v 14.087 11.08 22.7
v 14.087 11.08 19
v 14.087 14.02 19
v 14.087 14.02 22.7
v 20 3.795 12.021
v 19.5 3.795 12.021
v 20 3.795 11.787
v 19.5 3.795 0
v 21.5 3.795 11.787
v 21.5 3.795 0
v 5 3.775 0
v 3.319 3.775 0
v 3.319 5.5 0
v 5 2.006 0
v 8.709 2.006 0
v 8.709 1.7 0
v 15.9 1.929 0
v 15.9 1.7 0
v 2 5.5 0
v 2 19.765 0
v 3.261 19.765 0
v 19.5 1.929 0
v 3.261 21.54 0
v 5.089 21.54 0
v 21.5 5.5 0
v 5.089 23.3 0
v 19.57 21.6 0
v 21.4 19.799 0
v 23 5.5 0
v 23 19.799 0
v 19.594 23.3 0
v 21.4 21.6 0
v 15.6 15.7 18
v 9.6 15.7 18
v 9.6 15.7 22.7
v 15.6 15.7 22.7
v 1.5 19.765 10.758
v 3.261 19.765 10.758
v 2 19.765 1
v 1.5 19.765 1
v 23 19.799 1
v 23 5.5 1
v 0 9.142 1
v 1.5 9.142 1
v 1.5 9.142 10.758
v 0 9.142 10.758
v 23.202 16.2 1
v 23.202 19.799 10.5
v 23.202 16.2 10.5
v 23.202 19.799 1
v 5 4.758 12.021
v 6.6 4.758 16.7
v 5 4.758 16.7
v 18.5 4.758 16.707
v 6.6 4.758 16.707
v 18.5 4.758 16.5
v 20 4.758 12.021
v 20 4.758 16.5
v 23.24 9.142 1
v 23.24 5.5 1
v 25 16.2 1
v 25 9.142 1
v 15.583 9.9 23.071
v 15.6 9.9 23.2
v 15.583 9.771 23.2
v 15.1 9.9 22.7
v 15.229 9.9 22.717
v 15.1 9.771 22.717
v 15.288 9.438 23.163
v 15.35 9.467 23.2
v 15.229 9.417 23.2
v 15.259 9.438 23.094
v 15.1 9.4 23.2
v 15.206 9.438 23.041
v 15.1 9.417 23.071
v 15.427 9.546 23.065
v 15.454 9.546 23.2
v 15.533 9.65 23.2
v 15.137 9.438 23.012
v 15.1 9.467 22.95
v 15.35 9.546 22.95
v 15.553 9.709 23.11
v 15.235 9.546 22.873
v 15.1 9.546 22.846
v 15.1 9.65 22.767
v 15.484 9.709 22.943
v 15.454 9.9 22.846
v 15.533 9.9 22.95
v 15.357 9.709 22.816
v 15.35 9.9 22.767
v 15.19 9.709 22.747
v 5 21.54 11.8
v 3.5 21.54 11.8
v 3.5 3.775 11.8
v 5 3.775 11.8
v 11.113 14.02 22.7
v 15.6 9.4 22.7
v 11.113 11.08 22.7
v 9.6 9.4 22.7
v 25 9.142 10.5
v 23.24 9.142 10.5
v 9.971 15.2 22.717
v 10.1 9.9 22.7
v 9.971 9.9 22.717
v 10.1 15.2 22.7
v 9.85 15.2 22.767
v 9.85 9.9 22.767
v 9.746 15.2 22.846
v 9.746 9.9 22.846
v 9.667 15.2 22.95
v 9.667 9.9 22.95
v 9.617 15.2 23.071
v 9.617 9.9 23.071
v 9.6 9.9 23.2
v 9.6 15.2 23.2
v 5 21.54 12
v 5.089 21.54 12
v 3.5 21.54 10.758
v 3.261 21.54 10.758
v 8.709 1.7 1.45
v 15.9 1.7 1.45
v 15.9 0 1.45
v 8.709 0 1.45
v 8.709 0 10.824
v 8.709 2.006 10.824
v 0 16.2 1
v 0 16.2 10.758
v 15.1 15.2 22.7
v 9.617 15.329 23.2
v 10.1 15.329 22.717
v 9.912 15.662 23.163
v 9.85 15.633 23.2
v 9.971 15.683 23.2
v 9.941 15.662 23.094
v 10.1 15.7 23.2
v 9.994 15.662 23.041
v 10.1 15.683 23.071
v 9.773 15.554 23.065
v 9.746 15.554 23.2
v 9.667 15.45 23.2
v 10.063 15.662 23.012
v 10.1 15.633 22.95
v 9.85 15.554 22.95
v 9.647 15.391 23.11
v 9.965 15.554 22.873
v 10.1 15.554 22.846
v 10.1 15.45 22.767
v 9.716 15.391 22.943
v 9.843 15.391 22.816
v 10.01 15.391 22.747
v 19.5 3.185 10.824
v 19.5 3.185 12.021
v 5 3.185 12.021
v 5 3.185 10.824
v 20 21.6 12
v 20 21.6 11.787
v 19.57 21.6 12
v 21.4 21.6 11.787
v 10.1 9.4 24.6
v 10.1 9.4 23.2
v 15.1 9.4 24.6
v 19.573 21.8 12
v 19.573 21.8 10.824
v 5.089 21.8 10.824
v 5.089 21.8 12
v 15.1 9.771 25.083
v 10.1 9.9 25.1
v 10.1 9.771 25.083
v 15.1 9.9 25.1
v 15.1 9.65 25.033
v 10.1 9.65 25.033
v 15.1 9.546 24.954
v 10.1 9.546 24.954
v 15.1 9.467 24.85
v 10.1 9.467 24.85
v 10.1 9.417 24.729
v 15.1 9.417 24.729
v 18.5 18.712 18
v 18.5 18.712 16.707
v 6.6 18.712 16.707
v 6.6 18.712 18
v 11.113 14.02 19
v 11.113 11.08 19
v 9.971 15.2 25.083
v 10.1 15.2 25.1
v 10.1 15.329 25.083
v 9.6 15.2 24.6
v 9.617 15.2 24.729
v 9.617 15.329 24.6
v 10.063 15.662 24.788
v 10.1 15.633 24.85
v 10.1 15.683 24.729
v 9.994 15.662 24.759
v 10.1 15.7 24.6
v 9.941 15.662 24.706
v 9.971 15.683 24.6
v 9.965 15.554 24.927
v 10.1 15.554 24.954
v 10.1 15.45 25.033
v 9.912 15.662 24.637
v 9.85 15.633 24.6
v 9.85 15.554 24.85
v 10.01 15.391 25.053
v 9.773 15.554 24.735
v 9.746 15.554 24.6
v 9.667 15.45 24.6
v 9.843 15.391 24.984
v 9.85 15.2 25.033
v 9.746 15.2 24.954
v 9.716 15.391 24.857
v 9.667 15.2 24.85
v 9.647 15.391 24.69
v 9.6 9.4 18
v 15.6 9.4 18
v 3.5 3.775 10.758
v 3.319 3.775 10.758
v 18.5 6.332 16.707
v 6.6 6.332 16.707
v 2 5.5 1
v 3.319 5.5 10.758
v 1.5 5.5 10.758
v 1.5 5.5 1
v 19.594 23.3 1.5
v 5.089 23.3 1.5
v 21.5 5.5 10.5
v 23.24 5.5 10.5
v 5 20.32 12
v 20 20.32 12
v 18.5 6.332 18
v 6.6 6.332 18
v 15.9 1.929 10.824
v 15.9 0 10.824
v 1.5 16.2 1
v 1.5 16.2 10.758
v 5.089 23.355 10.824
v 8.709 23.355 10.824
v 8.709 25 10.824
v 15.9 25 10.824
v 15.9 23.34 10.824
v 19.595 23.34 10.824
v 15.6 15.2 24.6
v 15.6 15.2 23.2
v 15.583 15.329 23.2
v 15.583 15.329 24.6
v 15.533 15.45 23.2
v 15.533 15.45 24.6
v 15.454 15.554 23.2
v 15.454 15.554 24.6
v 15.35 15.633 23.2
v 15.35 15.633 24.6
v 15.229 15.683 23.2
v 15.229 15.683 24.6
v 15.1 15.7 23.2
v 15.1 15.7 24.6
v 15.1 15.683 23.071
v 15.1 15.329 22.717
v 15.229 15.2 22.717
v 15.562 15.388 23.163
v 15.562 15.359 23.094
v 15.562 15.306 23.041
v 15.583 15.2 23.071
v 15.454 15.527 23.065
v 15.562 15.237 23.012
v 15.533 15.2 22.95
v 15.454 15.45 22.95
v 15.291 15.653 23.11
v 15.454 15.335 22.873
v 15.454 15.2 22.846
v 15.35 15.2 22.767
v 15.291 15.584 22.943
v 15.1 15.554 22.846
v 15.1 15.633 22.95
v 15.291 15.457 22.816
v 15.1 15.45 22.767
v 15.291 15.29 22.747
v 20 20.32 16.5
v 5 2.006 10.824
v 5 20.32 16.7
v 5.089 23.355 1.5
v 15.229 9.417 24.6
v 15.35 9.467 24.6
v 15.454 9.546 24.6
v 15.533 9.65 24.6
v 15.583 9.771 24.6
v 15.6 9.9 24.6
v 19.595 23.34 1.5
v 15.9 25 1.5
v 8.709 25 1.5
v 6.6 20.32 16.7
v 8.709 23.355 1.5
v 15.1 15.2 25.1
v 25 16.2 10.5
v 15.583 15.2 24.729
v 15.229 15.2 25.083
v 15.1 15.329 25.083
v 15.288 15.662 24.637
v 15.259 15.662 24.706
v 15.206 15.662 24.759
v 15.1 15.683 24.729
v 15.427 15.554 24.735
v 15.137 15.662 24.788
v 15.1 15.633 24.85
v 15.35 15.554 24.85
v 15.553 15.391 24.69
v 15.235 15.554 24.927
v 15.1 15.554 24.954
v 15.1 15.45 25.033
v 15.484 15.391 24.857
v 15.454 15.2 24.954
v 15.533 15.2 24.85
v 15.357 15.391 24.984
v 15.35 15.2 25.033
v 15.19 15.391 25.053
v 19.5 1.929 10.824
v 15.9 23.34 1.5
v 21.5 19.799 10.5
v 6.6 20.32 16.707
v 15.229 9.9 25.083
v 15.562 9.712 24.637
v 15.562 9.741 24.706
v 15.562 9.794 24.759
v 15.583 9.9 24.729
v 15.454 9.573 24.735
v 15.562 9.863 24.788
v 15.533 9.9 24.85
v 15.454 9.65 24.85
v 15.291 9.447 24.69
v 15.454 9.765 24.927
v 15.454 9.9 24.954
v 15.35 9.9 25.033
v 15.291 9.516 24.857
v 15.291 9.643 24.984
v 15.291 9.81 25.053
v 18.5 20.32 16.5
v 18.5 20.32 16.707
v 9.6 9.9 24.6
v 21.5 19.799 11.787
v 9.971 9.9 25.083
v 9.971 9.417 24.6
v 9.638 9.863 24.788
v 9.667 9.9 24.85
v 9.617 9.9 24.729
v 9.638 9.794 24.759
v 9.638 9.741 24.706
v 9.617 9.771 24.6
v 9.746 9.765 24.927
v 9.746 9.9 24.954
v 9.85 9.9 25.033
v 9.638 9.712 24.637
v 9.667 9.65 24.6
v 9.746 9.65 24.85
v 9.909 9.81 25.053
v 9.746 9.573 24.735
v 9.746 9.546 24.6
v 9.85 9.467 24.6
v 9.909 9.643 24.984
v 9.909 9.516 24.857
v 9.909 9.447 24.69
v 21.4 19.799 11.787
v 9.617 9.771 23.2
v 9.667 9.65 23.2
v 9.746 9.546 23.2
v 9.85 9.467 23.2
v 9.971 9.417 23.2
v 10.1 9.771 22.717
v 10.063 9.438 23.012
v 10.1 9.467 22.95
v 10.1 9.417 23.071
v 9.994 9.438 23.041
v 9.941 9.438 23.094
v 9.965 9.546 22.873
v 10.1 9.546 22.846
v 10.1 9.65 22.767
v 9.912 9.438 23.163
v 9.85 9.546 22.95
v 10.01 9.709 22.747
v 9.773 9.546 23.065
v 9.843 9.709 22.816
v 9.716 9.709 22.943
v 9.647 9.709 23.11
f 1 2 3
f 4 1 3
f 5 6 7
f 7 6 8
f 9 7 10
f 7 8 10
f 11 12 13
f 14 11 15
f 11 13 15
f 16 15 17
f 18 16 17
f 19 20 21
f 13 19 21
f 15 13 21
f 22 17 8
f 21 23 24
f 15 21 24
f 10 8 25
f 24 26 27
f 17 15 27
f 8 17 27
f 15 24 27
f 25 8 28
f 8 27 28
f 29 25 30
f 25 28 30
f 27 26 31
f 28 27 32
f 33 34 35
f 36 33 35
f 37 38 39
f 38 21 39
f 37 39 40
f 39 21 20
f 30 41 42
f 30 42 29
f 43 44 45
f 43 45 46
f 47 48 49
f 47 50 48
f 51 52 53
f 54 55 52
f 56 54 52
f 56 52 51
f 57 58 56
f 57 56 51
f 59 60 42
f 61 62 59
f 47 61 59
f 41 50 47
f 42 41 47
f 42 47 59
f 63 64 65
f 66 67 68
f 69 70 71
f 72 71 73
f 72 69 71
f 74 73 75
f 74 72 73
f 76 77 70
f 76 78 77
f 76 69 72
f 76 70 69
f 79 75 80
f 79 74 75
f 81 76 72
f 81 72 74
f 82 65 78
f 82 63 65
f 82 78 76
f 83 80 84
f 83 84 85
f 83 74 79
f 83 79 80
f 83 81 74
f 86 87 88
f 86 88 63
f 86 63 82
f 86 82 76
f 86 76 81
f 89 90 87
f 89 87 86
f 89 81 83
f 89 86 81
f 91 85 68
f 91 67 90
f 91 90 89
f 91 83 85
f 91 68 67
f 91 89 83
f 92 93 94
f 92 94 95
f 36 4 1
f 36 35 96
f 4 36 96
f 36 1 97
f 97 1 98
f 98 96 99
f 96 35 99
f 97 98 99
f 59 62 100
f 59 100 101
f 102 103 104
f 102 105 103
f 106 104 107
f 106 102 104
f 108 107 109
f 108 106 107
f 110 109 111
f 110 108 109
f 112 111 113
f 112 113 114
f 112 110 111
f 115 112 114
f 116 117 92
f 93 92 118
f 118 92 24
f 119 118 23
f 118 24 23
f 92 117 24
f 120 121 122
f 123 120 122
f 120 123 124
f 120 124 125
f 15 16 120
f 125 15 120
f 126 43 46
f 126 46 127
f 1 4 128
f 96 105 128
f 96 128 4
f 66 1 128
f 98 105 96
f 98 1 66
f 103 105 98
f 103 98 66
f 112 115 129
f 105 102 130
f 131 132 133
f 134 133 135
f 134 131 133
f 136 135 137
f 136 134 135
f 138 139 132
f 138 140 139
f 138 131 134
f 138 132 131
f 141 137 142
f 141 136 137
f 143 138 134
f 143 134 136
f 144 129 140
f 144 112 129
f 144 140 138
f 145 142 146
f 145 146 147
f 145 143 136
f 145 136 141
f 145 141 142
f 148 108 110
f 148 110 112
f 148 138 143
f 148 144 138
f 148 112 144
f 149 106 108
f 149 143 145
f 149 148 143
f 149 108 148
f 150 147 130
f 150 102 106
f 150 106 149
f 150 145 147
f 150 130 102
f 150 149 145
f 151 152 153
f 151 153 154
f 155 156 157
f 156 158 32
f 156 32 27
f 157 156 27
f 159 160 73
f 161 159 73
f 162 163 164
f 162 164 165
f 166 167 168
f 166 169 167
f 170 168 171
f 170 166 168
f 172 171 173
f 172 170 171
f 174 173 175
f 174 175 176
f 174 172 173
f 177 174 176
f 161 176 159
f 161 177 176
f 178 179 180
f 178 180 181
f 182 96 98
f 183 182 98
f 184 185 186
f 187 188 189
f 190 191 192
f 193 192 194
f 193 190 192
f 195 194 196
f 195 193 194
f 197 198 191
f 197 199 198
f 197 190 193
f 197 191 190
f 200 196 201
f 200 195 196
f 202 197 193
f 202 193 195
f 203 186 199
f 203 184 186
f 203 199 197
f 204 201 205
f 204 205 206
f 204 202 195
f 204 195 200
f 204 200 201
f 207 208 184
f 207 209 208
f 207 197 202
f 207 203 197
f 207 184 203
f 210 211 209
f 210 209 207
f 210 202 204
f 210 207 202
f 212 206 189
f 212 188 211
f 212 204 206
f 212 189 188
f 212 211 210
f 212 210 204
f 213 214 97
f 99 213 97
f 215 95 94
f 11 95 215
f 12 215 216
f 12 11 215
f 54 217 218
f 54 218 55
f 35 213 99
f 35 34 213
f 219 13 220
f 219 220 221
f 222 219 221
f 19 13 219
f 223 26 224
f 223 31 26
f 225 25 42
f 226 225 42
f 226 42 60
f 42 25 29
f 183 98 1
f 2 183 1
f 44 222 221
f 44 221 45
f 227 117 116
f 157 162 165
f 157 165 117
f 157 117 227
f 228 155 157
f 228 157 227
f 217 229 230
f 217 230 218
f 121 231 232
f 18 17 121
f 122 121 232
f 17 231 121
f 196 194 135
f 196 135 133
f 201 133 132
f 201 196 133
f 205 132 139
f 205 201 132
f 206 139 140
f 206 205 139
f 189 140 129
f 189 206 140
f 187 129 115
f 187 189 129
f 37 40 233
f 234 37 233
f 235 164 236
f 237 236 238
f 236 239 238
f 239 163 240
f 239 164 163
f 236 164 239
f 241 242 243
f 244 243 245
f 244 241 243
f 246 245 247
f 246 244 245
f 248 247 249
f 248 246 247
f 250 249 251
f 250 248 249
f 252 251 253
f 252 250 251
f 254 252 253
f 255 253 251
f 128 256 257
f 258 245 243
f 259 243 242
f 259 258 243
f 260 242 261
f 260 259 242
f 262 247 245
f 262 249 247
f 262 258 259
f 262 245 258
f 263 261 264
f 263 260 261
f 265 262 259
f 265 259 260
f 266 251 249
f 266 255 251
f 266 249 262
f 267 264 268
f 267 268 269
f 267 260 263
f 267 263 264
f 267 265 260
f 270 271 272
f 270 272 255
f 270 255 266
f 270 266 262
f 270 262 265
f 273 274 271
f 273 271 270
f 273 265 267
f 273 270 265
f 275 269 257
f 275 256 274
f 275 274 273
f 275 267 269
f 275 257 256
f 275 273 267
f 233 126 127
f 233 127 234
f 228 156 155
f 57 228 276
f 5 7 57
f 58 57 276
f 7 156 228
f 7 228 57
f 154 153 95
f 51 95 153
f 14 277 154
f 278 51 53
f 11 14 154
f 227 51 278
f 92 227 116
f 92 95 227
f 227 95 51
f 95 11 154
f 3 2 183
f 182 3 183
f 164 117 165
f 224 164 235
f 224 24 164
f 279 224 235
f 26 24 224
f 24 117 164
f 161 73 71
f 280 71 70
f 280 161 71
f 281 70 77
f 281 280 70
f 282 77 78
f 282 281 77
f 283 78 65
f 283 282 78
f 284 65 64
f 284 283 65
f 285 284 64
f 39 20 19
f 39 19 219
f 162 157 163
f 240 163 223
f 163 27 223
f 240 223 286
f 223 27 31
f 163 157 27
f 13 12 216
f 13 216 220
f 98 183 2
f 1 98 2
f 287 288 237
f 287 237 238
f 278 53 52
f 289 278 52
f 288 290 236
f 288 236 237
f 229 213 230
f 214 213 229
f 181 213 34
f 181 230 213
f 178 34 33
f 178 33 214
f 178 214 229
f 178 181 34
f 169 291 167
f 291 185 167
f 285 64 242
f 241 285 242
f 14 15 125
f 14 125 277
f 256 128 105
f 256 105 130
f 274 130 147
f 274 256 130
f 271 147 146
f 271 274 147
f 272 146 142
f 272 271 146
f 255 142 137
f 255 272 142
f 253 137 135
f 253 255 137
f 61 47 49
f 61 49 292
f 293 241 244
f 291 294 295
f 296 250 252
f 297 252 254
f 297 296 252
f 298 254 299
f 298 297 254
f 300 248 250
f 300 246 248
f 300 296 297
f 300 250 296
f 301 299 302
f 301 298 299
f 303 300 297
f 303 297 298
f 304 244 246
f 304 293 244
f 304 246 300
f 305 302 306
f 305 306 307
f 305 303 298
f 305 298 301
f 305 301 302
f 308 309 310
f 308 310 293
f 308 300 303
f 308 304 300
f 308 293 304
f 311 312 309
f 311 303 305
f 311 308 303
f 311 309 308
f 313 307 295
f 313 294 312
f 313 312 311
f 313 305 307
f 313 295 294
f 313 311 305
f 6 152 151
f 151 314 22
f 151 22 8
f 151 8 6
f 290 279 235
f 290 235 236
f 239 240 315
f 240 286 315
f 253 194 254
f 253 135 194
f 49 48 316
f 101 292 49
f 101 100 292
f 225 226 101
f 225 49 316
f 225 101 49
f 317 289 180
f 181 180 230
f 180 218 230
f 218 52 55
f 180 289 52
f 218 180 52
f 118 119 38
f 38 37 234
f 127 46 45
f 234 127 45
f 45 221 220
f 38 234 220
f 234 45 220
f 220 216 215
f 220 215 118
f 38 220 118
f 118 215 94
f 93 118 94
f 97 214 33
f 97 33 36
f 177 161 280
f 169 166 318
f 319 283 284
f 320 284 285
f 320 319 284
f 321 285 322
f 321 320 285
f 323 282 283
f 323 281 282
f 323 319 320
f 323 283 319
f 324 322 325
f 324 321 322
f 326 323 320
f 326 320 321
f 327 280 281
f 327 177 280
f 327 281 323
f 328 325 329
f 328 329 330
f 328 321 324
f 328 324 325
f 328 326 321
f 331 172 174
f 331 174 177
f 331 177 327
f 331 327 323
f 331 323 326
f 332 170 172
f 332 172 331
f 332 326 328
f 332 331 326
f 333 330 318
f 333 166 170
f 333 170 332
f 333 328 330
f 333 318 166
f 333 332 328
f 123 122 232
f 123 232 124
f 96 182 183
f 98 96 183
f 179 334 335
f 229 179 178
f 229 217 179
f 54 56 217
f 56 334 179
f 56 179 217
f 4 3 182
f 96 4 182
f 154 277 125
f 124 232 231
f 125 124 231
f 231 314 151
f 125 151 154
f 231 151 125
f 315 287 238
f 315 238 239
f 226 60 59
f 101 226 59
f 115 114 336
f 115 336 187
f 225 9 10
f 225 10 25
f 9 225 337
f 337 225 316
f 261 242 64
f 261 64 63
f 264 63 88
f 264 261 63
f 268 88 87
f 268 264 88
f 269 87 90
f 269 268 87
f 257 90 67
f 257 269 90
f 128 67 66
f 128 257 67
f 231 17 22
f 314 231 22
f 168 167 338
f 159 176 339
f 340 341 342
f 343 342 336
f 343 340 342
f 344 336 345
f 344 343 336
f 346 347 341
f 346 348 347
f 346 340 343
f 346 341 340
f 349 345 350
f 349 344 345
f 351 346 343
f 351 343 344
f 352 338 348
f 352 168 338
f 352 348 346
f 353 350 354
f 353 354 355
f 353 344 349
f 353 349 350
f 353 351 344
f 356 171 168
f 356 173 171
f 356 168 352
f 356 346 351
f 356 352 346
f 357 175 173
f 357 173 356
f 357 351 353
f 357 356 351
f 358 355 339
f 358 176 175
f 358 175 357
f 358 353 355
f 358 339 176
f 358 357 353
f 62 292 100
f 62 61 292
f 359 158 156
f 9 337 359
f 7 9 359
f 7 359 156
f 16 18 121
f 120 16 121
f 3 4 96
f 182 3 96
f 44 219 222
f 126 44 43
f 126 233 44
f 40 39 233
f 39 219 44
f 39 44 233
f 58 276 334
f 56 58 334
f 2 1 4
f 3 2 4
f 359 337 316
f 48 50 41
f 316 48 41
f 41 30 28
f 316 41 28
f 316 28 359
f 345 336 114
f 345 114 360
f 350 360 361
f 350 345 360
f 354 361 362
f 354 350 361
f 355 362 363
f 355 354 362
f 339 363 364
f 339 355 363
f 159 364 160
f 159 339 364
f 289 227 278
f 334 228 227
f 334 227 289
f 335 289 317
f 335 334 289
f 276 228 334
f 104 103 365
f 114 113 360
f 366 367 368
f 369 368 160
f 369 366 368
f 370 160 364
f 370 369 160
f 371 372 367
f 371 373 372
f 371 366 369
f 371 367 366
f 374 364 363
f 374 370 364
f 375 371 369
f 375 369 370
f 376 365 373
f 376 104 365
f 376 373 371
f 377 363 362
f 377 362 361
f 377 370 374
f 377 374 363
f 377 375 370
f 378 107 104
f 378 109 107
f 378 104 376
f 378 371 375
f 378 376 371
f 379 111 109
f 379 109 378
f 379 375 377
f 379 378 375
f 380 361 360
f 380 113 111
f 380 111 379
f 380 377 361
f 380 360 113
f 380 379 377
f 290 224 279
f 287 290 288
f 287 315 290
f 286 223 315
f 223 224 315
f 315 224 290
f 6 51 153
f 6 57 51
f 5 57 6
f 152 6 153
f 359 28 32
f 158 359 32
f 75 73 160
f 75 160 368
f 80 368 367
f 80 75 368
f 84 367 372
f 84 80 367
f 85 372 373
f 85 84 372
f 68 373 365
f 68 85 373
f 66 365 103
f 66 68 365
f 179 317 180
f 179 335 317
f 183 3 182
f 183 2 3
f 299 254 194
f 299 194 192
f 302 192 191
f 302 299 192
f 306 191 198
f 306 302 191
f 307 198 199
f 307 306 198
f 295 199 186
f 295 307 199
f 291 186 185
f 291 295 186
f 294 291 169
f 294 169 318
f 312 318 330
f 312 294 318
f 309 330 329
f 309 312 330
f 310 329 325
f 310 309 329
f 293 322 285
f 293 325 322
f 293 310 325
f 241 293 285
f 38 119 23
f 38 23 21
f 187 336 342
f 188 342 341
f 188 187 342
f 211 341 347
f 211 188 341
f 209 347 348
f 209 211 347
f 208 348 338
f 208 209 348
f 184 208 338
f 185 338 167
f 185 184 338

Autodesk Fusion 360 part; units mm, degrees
sketch "Esquisse1" plane through (0, 0, 0) normal (0, 0, 1) x (1, 0, 0)
  line L0 (25, 25) -> (-25, 25)
  line L1 (-25, 25) -> (-25, -25)
  line L2 (-25, -25) -> (25, -25)
  line L3 (25, -25) -> (25, 25)
  line L4 (25, 25) -> (-25, -25) construction
  line L5 (-25, 25) -> (25, -25) construction
sketch "Esquisse2" plane through (0, 0, 0) normal (0, 0, 1) x (1, 0, 0)
  line L0 (25, 0) -> (0, 0)
  line L1 (0, 0) -> (0, 25)
  line L2 (0, 25) -> (25, 25)
  line L3 (25, 25) -> (25, 0)
  line L4 (25, 9.1424) -> (0, 9.1424)
  line L5 (0, 9.1424) -> (0, 16.2)
  line L6 (0, 16.2) -> (25, 16.2)
  line L7 (25, 16.2) -> (25, 9.1424)
  line L8 (15.9, 0) -> (8.7089, 0)
  line L9 (8.7089, 0) -> (8.7089, 25)
  line L10 (8.7089, 25) -> (15.9, 25)
  line L11 (15.9, 25) -> (15.9, 0)
  line L12 (23.2024, 19.7988) -> (23.2024, 16.2)
  line L13 (19.595, 23.3399) -> (15.9, 23.3399)
  line L14 (23.2024, 19.7988) -> (21.4, 19.7988)
  line L15 (21.4, 19.7988) -> (21.4, 21.6)
  line L16 (21.4, 21.6) -> (19.57, 21.6)
  line L17 (19.57, 21.6) -> (19.595, 23.3399)
  line L18 (5.0893, 23.3546) -> (8.7089, 23.3546)
  line L19 (5.0893, 21.5398) -> (5.0893, 23.3546)
  line L20 (5.0893, 21.5398) -> (3.2612, 21.5398)
  line L21 (3.2612, 21.5398) -> (3.2612, 19.7651)
  line L22 (3.2612, 19.7651) -> (1.5, 19.7651)
  line L23 (1.5, 19.7651) -> (1.5, 16.2)
  line L24 (8.7089, 2.0063) -> (5, 2.0063)
  line L25 (5, 2.0063) -> (5, 3.7754)
  line L26 (5, 3.7754) -> (3.3188, 3.7754)
  line L27 (3.3188, 3.7754) -> (3.3188, 5.5)
  line L28 (3.3188, 5.5) -> (1.5, 5.5)
  line L29 (1.5, 5.5) -> (1.5, 9.1424)
  line L30 (15.9, 1.9294) -> (19.5, 1.9294)
  line L31 (19.5, 1.9294) -> (19.5, 3.7947)
  line L32 (19.5, 3.7947) -> (21.5, 3.7947)
  line L33 (21.5, 3.7947) -> (21.5, 5.5)
  line L34 (21.5, 5.5) -> (23.2404, 5.5)
  line L35 (23.2404, 5.5) -> (23.2404, 9.1424)
extrude "Extrusion2" add sketch "Esquisse2" along normal blind 18 contours L0 L4 L8 L9 L11 | L3 L4 L6 L7 L11 | L4 L11 L30 L31 L32 L33 L34 L35 | L4 L9 L24 L25 L26 L27 L28 L29 | L4 L6 L9 L11 | L6 L11 L12 L13 L14 L15 L16 L17 | L1 L4 L5 L6 L9 | L2 L6 L9 L10 L11 | L6 L9 L18 L19 L20 L21 L22 L23 makes body 1
sketch "Esquisse3" plane through (0, 0, 0) normal (0, 1, 0) x (1, 0, 0)
  line L0 (25, -10.5) -> (21.5, -10.5)
  line L1 (21.5, -10.5) -> (21.5, -11.7872)
  line L2 (21.5, -11.7872) -> (20, -11.7872)
  line L3 (20, -11.7872) -> (20, -16.5)
  line L4 (20, -16.5) -> (18.5, -16.5)
  line L5 (18.5, -16.5) -> (18.5, -18)
  line L6 (18.5, -18) -> (15.5, -18)
  line L7 (15.5, -18) -> (15.5, -22.7294)
  line L8 (15.5, -22.7294) -> (14, -22.7294)
  line L9 (14, -22.7294) -> (14, -18)
  line L10 (14, -18) -> (15.5, -18)
  line L11 (-0.0186, -10.7584) -> (3.5, -10.7584)
  line L12 (3.5, -10.7584) -> (3.5, -11.8)
  line L13 (3.5, -11.8) -> (5, -11.8)
  line L14 (5, -11.8) -> (5, -16.7)
  line L15 (5, -16.7) -> (6.6, -16.7)
  line L16 (6.6, -16.7) -> (6.6, -18)
  line L17 (6.6, -18) -> (9.5, -18)
  line L18 (9.5, -18) -> (9.5, -22.7)
  line L19 (9.5, -22.7) -> (11.1, -22.7)
  line L20 (11.1, -22.7) -> (11.1, -18)
  line L21 (11.1, -18) -> (9.5, -18)
  line L22 (9.5, -22.7) -> (0, -22.7)
  line L23 (0, -22.7) -> (-0.0186, -10.7584)
  line L24 (15.5, -22.7294) -> (25, -22.7294)
  line L25 (25, -22.7294) -> (25, -10.5)
extrude "Extrusion3" cut sketch "Esquisse3" along normal blind 39 contours L0 L1 L2 L3 L4 L5 L6 L7 L24 L25 | L11 L12 L13 L14 L15 L16 L17 L18 L22 L23 bodies 1
sketch "Esquisse4" plane through (0, 25, 0) normal (0, 1, 0) x (-1, 0, 0)
  line L0 (-15.9, 0) -> (-8.7089, 0)
  line L1 (-8.7089, 0) -> (-8.7089, 18)
  line L2 (-8.7089, 18) -> (-15.9, 18)
  line L3 (-15.9, 18) -> (-15.9, 0)
  line L4 (-25, 1) -> (-23, 1)
  line L5 (-23, 1) -> (-23, -0.7028)
  line L6 (-23, -0.7028) -> (-25, -0.7028)
  line L7 (-25, -0.7028) -> (-25, 1)
  line L8 (-2, 1) -> (1, 1)
  line L9 (1, 1) -> (1, -1.75)
  line L10 (1, -1.75) -> (-2, -1.75)
  line L11 (-2, -1.75) -> (-2, 1)
extrude "Extrusion4" cut sketch "Esquisse4" against normal blind 27 contours L4 L5 L6 L7 | L8 L9 L10 L11 bodies 1
sketch "Esquisse5" plane through (25, 0, 0) normal (1, 0, 0) x (0, 1, 0)
  line L0 (9.1424, 1) -> (16.2, 1)
  line L1 (16.2, 1) -> (16.2, 10.5)
  line L2 (16.2, 10.5) -> (9.1424, 10.5)
  line L3 (9.1424, 10.5) -> (9.1424, 1)
  line L4 (-0.1313, 10.8245) -> (28, 10.8245)
  line L5 (28, 10.8245) -> (28, 18)
  line L6 (28, 18) -> (-0.1313, 18)
  line L7 (-0.1313, 18) -> (-0.1313, 10.8245)
  line L8 (3.1847, 10.8245) -> (-0.1313, 10.8245)
  line L9 (-0.1313, 10.8245) -> (-0.1313, 18)
  line L10 (-0.1313, 18) -> (3.1847, 18)
  line L11 (3.1847, 18) -> (3.1847, 10.8245)
  line L12 (4.7584, 12.0208) -> (3.1847, 12.0208)
  line L13 (3.1847, 12.0208) -> (3.1847, 18)
  line L14 (3.1847, 18) -> (4.7584, 18)
  line L15 (4.7584, 18) -> (4.7584, 12.0208)
  line L16 (6.3321, 16.7068) -> (4.7584, 16.7068)
  line L17 (4.7584, 16.7068) -> (4.7584, 18)
  line L18 (4.7584, 18) -> (6.3321, 18)
  line L19 (6.3321, 18) -> (6.3321, 16.7068)
  line L20 (18.7115, 18) -> (28, 18)
  line L21 (28, 18) -> (28, 16.7068)
  line L22 (28, 16.7068) -> (18.7115, 16.7068)
  line L23 (18.7115, 16.7068) -> (18.7115, 18)
  line L24 (20.3201, 16.7068) -> (28, 16.7068)
  line L25 (28, 16.7068) -> (28, 12)
  line L26 (28, 12) -> (20.3201, 12)
  line L27 (20.3201, 12) -> (20.3201, 16.7068)
  line L28 (28, 10.8245) -> (21.8, 10.8245)
  line L29 (21.8, 10.8245) -> (21.8, 12)
  line L30 (21.8, 12) -> (28, 12)
  line L31 (28, 12) -> (28, 10.8245)
extrude "Extrusion5" cut sketch "Esquisse5" against normal blind 32 contours L4 L6 L7 L8 L9 L10 L11 L13 | L4 L5 L26 L28 L29 L30 L31 | L6 L11 L12 L13 L14 L15 L17 | L5 L22 L24 L25 L26 L27 L30 | L6 L15 L16 L17 L18 L19 | L5 L6 L20 L21 L22 L23 L24 bodies 1
sketch "Esquisse6" plane through (25, 0, 0) normal (1, 0, 0) x (0, 1, 0)
  line L0 (9.1424, 1) -> (16.2, 1)
  line L1 (16.2, 1) -> (16.2, 10.5)
  line L2 (16.2, 10.5) -> (9.1424, 10.5)
  line L3 (9.1424, 10.5) -> (9.1424, 1)
  line L4 (23.3, 1.5) -> (25.7, 1.5)
  line L5 (25.7, 1.5) -> (25.7, -0.6)
  line L6 (25.7, -0.6) -> (23.3, -0.6)
  line L7 (23.3, -0.6) -> (23.3, 1.5)
  line L8 (1.7, 1.45) -> (-0.9, 1.45)
  line L9 (-0.9, 1.45) -> (-0.9, -0.6)
  line L10 (-0.9, -0.6) -> (1.7, -0.6)
  line L11 (1.7, -0.6) -> (1.7, 1.45)
extrude "Extrusion6" cut sketch "Esquisse6" against normal blind 26 contours L4 L5 L6 L7 | L8 L9 L10 L11 bodies 1
sketch "Esquisse7" plane through (0, 0, 18) normal (0, 0, 1) x (-1, 0, 0)
  line L0 (-6.6, -6.3321) -> (-18.5, -6.3321)
  line L1 (-18.5, -6.3321) -> (-18.5, -18.7115)
  line L2 (-18.5, -18.7115) -> (-6.6, -18.7115)
  line L3 (-6.6, -18.7115) -> (-6.6, -6.3321)
  line L4 (-15, -10) -> (-10, -10)
  line L5 (-10, -10) -> (-10, -15)
  line L6 (-10, -15) -> (-15, -15)
  line L7 (-15, -15) -> (-15, -10)
extrude "Extrusion7" add sketch "Esquisse7" along normal blind 7 contours L4 L5 L6 L7 bodies 1
extrude "Extrusion8" add 1 faces at (10, 11.6667, 20.3333) along direction (-1, 0, 0) blind 0.4 on bodies 1 bodies 1
extrude "Extrusion9" add 1 faces at (15, 13.3333, 20.3333) along direction (1, 0, 0) blind 0.6 on bodies 1 bodies 1
extrude "Extrusion10" add 1 faces at (13.6, 15, 20.3333) along direction (0, 1, 0) blind 0.7 on bodies 1 bodies 1
extrude "Extrusion11" add 1 faces at (11.6, 10, 20.3333) along direction (0, -1, 0) blind 0.6 on bodies 1 bodies 1
sketch "Esquisse8" plane through (0, 0, 25) normal (0, 0, 1) x (-1, 0, 0)
  line L0 (-9.6, -15.7) -> (-9.6, -9.4)
  line L1 (-9.6, -9.4) -> (-15.6, -9.4)
  line L2 (-15.6, -9.4) -> (-15.6, -15.7)
  line L3 (-15.6, -15.7) -> (-9.6, -15.7)
  line L4 (-15.0873, -15.2195) -> (-10.1127, -15.2195)
  line L5 (-10.1127, -15.2195) -> (-10.1127, -9.8805)
  line L6 (-10.1127, -9.8805) -> (-15.0873, -9.8805)
  line L7 (-15.0873, -9.8805) -> (-15.0873, -15.2195)
  line L8 (-15.0873, -15.2195) -> (-10.1127, -9.8805) construction
  point P0 (-12.6, -12.55)
extrude "Extrusion12" cut sketch "Esquisse8" against normal blind 6 contours L4 L5 L6 L7 bodies 1
extrude "Extrusion13" add 1 faces at (13.4291, 15.2195, 23) along direction (0, -1, 0) blind 1.2 on bodies 1 bodies 1
extrude "Extrusion14" add 1 faces at (11.7709, 9.8805, 23) along direction (0, 1, 0) blind 1.2 on bodies 1 bodies 1
extrude "Extrusion15" add 1 faces at (15.0873, 12.0602, 23) along direction (-1, 0, 0) blind 1 on bodies 1 bodies 1
extrude "Extrusion16" add 1 faces at (10.1127, 13.0398, 23) along direction (1, 0, 0) blind 1 on bodies 1 bodies 1
extrude "Extrusion17" cut 1 faces at (12.1042, 15.1398, 25) along direction (0, 0, -1) blind 2.3 on bodies 1 bodies 1
extrude "Extrusion18" add 1 faces at (12.1042, 12.0602, 19) along direction (0, 0, 1) blind 3.7 separate body on bodies 1 makes body 2
extrude "Extrusion19" add 2 faces at (12.1042, 15.1398, 22.7) (12.1042, 12.0602, 22.7) along direction (0, 0, 1) blind 2.4 separate body on bodies 1 2 makes body 3
fillet "Congé1" radius 0.5 12 edges at (12.6, 9.4, 25.1) (9.6, 12.55, 25.1) (15.6, 12.55, 25.1) (12.6, 15.7, 25.1) (9.6, 12.55, 22.7) (12.6, 15.7, 22.7) (15.6, 12.55, 22.7) (12.6, 9.4, 22.7) (15.6, 9.4, 23.9) (9.6, 9.4, 23.9) (9.6, 15.7, 23.9) (15.6, 15.7, 23.9) on bodies 3
combine "Combiner1" operation add target body 3 tool bodies 2
sketch "Esquisse9" plane through (0, 0, 0) normal (0, 0, 1) x (1, 0, 0)
  line L0 (-15, -15) -> (-25, -15)
  line L1 (-25, -15) -> (-25, -25)
  line L2 (-25, -25) -> (-15, -25)
  line L3 (-15, -25) -> (-15, -15)
sketch "Esquisse10" plane through (0, 0, 2.5) normal (0, 0, 1) x (-1, 0, 0)
  line L0 (15, 25) -> (15, 15)
  line L1 (15, 15) -> (25, 15)
  line L2 (25, 15) -> (25, 25)
  line L3 (25, 25) -> (15, 25)
  line L4 (10, 10) -> (30, 10)
  line L5 (30, 10) -> (30, 30)
  line L6 (30, 30) -> (10, 30)
  line L7 (10, 30) -> (10, 10)
  line L8 (10, 10) -> (30, 30) construction
  line L9 (30, 10) -> (10, 30) construction
  point P0 (20, 20)
sketch "Esquisse11" plane through (0, 0, 5) normal (0, 0, 1) x (-1, 0, 0)
  line L0 (15, 25) -> (25, 25)
  line L1 (25, 25) -> (25, 15)
  line L2 (25, 15) -> (15, 15)
  line L3 (15, 15) -> (15, 25)
  line L4 (10, 30) -> (10, 10)
  line L5 (10, 10) -> (30, 10)
  line L6 (30, 10) -> (30, 30)
  line L7 (30, 30) -> (10, 30)
  line L8 (7, 7) -> (33, 7)
  line L9 (33, 7) -> (33, 33)
  line L10 (33, 33) -> (7, 33)
  line L11 (7, 33) -> (7, 7)
  line L12 (7, 7) -> (33, 33) construction
  line L13 (33, 7) -> (7, 33) construction
  point P0 (20, 20)
sketch "Esquisse12" plane through (-7, 0, 0) normal (1, 0, 0) x (0, 1, 0)
  line L0 (-7, 7.5) -> (-7, 26.5)
  line L1 (-7, 26.5) -> (-33, 26.5)
  line L2 (-33, 26.5) -> (-33, 7.5)
  line L3 (-33, 7.5) -> (-7, 7.5)
sketch "Esquisse13" plane through (0, 0, 26.5) normal (0, 0, 1) x (-1, 0, 0)
  line L0 (10, 30) -> (30, 30)
  line L1 (30, 30) -> (30, 10)
  line L2 (30, 10) -> (10, 10)
  line L3 (10, 10) -> (10, 30)
  line L4 (7, 33) -> (7, 7)
  line L5 (7, 7) -> (33, 7)
  line L6 (33, 7) -> (33, 33)
  line L7 (33, 33) -> (7, 33)
  circle A0 centre (20, 20) radius 13
